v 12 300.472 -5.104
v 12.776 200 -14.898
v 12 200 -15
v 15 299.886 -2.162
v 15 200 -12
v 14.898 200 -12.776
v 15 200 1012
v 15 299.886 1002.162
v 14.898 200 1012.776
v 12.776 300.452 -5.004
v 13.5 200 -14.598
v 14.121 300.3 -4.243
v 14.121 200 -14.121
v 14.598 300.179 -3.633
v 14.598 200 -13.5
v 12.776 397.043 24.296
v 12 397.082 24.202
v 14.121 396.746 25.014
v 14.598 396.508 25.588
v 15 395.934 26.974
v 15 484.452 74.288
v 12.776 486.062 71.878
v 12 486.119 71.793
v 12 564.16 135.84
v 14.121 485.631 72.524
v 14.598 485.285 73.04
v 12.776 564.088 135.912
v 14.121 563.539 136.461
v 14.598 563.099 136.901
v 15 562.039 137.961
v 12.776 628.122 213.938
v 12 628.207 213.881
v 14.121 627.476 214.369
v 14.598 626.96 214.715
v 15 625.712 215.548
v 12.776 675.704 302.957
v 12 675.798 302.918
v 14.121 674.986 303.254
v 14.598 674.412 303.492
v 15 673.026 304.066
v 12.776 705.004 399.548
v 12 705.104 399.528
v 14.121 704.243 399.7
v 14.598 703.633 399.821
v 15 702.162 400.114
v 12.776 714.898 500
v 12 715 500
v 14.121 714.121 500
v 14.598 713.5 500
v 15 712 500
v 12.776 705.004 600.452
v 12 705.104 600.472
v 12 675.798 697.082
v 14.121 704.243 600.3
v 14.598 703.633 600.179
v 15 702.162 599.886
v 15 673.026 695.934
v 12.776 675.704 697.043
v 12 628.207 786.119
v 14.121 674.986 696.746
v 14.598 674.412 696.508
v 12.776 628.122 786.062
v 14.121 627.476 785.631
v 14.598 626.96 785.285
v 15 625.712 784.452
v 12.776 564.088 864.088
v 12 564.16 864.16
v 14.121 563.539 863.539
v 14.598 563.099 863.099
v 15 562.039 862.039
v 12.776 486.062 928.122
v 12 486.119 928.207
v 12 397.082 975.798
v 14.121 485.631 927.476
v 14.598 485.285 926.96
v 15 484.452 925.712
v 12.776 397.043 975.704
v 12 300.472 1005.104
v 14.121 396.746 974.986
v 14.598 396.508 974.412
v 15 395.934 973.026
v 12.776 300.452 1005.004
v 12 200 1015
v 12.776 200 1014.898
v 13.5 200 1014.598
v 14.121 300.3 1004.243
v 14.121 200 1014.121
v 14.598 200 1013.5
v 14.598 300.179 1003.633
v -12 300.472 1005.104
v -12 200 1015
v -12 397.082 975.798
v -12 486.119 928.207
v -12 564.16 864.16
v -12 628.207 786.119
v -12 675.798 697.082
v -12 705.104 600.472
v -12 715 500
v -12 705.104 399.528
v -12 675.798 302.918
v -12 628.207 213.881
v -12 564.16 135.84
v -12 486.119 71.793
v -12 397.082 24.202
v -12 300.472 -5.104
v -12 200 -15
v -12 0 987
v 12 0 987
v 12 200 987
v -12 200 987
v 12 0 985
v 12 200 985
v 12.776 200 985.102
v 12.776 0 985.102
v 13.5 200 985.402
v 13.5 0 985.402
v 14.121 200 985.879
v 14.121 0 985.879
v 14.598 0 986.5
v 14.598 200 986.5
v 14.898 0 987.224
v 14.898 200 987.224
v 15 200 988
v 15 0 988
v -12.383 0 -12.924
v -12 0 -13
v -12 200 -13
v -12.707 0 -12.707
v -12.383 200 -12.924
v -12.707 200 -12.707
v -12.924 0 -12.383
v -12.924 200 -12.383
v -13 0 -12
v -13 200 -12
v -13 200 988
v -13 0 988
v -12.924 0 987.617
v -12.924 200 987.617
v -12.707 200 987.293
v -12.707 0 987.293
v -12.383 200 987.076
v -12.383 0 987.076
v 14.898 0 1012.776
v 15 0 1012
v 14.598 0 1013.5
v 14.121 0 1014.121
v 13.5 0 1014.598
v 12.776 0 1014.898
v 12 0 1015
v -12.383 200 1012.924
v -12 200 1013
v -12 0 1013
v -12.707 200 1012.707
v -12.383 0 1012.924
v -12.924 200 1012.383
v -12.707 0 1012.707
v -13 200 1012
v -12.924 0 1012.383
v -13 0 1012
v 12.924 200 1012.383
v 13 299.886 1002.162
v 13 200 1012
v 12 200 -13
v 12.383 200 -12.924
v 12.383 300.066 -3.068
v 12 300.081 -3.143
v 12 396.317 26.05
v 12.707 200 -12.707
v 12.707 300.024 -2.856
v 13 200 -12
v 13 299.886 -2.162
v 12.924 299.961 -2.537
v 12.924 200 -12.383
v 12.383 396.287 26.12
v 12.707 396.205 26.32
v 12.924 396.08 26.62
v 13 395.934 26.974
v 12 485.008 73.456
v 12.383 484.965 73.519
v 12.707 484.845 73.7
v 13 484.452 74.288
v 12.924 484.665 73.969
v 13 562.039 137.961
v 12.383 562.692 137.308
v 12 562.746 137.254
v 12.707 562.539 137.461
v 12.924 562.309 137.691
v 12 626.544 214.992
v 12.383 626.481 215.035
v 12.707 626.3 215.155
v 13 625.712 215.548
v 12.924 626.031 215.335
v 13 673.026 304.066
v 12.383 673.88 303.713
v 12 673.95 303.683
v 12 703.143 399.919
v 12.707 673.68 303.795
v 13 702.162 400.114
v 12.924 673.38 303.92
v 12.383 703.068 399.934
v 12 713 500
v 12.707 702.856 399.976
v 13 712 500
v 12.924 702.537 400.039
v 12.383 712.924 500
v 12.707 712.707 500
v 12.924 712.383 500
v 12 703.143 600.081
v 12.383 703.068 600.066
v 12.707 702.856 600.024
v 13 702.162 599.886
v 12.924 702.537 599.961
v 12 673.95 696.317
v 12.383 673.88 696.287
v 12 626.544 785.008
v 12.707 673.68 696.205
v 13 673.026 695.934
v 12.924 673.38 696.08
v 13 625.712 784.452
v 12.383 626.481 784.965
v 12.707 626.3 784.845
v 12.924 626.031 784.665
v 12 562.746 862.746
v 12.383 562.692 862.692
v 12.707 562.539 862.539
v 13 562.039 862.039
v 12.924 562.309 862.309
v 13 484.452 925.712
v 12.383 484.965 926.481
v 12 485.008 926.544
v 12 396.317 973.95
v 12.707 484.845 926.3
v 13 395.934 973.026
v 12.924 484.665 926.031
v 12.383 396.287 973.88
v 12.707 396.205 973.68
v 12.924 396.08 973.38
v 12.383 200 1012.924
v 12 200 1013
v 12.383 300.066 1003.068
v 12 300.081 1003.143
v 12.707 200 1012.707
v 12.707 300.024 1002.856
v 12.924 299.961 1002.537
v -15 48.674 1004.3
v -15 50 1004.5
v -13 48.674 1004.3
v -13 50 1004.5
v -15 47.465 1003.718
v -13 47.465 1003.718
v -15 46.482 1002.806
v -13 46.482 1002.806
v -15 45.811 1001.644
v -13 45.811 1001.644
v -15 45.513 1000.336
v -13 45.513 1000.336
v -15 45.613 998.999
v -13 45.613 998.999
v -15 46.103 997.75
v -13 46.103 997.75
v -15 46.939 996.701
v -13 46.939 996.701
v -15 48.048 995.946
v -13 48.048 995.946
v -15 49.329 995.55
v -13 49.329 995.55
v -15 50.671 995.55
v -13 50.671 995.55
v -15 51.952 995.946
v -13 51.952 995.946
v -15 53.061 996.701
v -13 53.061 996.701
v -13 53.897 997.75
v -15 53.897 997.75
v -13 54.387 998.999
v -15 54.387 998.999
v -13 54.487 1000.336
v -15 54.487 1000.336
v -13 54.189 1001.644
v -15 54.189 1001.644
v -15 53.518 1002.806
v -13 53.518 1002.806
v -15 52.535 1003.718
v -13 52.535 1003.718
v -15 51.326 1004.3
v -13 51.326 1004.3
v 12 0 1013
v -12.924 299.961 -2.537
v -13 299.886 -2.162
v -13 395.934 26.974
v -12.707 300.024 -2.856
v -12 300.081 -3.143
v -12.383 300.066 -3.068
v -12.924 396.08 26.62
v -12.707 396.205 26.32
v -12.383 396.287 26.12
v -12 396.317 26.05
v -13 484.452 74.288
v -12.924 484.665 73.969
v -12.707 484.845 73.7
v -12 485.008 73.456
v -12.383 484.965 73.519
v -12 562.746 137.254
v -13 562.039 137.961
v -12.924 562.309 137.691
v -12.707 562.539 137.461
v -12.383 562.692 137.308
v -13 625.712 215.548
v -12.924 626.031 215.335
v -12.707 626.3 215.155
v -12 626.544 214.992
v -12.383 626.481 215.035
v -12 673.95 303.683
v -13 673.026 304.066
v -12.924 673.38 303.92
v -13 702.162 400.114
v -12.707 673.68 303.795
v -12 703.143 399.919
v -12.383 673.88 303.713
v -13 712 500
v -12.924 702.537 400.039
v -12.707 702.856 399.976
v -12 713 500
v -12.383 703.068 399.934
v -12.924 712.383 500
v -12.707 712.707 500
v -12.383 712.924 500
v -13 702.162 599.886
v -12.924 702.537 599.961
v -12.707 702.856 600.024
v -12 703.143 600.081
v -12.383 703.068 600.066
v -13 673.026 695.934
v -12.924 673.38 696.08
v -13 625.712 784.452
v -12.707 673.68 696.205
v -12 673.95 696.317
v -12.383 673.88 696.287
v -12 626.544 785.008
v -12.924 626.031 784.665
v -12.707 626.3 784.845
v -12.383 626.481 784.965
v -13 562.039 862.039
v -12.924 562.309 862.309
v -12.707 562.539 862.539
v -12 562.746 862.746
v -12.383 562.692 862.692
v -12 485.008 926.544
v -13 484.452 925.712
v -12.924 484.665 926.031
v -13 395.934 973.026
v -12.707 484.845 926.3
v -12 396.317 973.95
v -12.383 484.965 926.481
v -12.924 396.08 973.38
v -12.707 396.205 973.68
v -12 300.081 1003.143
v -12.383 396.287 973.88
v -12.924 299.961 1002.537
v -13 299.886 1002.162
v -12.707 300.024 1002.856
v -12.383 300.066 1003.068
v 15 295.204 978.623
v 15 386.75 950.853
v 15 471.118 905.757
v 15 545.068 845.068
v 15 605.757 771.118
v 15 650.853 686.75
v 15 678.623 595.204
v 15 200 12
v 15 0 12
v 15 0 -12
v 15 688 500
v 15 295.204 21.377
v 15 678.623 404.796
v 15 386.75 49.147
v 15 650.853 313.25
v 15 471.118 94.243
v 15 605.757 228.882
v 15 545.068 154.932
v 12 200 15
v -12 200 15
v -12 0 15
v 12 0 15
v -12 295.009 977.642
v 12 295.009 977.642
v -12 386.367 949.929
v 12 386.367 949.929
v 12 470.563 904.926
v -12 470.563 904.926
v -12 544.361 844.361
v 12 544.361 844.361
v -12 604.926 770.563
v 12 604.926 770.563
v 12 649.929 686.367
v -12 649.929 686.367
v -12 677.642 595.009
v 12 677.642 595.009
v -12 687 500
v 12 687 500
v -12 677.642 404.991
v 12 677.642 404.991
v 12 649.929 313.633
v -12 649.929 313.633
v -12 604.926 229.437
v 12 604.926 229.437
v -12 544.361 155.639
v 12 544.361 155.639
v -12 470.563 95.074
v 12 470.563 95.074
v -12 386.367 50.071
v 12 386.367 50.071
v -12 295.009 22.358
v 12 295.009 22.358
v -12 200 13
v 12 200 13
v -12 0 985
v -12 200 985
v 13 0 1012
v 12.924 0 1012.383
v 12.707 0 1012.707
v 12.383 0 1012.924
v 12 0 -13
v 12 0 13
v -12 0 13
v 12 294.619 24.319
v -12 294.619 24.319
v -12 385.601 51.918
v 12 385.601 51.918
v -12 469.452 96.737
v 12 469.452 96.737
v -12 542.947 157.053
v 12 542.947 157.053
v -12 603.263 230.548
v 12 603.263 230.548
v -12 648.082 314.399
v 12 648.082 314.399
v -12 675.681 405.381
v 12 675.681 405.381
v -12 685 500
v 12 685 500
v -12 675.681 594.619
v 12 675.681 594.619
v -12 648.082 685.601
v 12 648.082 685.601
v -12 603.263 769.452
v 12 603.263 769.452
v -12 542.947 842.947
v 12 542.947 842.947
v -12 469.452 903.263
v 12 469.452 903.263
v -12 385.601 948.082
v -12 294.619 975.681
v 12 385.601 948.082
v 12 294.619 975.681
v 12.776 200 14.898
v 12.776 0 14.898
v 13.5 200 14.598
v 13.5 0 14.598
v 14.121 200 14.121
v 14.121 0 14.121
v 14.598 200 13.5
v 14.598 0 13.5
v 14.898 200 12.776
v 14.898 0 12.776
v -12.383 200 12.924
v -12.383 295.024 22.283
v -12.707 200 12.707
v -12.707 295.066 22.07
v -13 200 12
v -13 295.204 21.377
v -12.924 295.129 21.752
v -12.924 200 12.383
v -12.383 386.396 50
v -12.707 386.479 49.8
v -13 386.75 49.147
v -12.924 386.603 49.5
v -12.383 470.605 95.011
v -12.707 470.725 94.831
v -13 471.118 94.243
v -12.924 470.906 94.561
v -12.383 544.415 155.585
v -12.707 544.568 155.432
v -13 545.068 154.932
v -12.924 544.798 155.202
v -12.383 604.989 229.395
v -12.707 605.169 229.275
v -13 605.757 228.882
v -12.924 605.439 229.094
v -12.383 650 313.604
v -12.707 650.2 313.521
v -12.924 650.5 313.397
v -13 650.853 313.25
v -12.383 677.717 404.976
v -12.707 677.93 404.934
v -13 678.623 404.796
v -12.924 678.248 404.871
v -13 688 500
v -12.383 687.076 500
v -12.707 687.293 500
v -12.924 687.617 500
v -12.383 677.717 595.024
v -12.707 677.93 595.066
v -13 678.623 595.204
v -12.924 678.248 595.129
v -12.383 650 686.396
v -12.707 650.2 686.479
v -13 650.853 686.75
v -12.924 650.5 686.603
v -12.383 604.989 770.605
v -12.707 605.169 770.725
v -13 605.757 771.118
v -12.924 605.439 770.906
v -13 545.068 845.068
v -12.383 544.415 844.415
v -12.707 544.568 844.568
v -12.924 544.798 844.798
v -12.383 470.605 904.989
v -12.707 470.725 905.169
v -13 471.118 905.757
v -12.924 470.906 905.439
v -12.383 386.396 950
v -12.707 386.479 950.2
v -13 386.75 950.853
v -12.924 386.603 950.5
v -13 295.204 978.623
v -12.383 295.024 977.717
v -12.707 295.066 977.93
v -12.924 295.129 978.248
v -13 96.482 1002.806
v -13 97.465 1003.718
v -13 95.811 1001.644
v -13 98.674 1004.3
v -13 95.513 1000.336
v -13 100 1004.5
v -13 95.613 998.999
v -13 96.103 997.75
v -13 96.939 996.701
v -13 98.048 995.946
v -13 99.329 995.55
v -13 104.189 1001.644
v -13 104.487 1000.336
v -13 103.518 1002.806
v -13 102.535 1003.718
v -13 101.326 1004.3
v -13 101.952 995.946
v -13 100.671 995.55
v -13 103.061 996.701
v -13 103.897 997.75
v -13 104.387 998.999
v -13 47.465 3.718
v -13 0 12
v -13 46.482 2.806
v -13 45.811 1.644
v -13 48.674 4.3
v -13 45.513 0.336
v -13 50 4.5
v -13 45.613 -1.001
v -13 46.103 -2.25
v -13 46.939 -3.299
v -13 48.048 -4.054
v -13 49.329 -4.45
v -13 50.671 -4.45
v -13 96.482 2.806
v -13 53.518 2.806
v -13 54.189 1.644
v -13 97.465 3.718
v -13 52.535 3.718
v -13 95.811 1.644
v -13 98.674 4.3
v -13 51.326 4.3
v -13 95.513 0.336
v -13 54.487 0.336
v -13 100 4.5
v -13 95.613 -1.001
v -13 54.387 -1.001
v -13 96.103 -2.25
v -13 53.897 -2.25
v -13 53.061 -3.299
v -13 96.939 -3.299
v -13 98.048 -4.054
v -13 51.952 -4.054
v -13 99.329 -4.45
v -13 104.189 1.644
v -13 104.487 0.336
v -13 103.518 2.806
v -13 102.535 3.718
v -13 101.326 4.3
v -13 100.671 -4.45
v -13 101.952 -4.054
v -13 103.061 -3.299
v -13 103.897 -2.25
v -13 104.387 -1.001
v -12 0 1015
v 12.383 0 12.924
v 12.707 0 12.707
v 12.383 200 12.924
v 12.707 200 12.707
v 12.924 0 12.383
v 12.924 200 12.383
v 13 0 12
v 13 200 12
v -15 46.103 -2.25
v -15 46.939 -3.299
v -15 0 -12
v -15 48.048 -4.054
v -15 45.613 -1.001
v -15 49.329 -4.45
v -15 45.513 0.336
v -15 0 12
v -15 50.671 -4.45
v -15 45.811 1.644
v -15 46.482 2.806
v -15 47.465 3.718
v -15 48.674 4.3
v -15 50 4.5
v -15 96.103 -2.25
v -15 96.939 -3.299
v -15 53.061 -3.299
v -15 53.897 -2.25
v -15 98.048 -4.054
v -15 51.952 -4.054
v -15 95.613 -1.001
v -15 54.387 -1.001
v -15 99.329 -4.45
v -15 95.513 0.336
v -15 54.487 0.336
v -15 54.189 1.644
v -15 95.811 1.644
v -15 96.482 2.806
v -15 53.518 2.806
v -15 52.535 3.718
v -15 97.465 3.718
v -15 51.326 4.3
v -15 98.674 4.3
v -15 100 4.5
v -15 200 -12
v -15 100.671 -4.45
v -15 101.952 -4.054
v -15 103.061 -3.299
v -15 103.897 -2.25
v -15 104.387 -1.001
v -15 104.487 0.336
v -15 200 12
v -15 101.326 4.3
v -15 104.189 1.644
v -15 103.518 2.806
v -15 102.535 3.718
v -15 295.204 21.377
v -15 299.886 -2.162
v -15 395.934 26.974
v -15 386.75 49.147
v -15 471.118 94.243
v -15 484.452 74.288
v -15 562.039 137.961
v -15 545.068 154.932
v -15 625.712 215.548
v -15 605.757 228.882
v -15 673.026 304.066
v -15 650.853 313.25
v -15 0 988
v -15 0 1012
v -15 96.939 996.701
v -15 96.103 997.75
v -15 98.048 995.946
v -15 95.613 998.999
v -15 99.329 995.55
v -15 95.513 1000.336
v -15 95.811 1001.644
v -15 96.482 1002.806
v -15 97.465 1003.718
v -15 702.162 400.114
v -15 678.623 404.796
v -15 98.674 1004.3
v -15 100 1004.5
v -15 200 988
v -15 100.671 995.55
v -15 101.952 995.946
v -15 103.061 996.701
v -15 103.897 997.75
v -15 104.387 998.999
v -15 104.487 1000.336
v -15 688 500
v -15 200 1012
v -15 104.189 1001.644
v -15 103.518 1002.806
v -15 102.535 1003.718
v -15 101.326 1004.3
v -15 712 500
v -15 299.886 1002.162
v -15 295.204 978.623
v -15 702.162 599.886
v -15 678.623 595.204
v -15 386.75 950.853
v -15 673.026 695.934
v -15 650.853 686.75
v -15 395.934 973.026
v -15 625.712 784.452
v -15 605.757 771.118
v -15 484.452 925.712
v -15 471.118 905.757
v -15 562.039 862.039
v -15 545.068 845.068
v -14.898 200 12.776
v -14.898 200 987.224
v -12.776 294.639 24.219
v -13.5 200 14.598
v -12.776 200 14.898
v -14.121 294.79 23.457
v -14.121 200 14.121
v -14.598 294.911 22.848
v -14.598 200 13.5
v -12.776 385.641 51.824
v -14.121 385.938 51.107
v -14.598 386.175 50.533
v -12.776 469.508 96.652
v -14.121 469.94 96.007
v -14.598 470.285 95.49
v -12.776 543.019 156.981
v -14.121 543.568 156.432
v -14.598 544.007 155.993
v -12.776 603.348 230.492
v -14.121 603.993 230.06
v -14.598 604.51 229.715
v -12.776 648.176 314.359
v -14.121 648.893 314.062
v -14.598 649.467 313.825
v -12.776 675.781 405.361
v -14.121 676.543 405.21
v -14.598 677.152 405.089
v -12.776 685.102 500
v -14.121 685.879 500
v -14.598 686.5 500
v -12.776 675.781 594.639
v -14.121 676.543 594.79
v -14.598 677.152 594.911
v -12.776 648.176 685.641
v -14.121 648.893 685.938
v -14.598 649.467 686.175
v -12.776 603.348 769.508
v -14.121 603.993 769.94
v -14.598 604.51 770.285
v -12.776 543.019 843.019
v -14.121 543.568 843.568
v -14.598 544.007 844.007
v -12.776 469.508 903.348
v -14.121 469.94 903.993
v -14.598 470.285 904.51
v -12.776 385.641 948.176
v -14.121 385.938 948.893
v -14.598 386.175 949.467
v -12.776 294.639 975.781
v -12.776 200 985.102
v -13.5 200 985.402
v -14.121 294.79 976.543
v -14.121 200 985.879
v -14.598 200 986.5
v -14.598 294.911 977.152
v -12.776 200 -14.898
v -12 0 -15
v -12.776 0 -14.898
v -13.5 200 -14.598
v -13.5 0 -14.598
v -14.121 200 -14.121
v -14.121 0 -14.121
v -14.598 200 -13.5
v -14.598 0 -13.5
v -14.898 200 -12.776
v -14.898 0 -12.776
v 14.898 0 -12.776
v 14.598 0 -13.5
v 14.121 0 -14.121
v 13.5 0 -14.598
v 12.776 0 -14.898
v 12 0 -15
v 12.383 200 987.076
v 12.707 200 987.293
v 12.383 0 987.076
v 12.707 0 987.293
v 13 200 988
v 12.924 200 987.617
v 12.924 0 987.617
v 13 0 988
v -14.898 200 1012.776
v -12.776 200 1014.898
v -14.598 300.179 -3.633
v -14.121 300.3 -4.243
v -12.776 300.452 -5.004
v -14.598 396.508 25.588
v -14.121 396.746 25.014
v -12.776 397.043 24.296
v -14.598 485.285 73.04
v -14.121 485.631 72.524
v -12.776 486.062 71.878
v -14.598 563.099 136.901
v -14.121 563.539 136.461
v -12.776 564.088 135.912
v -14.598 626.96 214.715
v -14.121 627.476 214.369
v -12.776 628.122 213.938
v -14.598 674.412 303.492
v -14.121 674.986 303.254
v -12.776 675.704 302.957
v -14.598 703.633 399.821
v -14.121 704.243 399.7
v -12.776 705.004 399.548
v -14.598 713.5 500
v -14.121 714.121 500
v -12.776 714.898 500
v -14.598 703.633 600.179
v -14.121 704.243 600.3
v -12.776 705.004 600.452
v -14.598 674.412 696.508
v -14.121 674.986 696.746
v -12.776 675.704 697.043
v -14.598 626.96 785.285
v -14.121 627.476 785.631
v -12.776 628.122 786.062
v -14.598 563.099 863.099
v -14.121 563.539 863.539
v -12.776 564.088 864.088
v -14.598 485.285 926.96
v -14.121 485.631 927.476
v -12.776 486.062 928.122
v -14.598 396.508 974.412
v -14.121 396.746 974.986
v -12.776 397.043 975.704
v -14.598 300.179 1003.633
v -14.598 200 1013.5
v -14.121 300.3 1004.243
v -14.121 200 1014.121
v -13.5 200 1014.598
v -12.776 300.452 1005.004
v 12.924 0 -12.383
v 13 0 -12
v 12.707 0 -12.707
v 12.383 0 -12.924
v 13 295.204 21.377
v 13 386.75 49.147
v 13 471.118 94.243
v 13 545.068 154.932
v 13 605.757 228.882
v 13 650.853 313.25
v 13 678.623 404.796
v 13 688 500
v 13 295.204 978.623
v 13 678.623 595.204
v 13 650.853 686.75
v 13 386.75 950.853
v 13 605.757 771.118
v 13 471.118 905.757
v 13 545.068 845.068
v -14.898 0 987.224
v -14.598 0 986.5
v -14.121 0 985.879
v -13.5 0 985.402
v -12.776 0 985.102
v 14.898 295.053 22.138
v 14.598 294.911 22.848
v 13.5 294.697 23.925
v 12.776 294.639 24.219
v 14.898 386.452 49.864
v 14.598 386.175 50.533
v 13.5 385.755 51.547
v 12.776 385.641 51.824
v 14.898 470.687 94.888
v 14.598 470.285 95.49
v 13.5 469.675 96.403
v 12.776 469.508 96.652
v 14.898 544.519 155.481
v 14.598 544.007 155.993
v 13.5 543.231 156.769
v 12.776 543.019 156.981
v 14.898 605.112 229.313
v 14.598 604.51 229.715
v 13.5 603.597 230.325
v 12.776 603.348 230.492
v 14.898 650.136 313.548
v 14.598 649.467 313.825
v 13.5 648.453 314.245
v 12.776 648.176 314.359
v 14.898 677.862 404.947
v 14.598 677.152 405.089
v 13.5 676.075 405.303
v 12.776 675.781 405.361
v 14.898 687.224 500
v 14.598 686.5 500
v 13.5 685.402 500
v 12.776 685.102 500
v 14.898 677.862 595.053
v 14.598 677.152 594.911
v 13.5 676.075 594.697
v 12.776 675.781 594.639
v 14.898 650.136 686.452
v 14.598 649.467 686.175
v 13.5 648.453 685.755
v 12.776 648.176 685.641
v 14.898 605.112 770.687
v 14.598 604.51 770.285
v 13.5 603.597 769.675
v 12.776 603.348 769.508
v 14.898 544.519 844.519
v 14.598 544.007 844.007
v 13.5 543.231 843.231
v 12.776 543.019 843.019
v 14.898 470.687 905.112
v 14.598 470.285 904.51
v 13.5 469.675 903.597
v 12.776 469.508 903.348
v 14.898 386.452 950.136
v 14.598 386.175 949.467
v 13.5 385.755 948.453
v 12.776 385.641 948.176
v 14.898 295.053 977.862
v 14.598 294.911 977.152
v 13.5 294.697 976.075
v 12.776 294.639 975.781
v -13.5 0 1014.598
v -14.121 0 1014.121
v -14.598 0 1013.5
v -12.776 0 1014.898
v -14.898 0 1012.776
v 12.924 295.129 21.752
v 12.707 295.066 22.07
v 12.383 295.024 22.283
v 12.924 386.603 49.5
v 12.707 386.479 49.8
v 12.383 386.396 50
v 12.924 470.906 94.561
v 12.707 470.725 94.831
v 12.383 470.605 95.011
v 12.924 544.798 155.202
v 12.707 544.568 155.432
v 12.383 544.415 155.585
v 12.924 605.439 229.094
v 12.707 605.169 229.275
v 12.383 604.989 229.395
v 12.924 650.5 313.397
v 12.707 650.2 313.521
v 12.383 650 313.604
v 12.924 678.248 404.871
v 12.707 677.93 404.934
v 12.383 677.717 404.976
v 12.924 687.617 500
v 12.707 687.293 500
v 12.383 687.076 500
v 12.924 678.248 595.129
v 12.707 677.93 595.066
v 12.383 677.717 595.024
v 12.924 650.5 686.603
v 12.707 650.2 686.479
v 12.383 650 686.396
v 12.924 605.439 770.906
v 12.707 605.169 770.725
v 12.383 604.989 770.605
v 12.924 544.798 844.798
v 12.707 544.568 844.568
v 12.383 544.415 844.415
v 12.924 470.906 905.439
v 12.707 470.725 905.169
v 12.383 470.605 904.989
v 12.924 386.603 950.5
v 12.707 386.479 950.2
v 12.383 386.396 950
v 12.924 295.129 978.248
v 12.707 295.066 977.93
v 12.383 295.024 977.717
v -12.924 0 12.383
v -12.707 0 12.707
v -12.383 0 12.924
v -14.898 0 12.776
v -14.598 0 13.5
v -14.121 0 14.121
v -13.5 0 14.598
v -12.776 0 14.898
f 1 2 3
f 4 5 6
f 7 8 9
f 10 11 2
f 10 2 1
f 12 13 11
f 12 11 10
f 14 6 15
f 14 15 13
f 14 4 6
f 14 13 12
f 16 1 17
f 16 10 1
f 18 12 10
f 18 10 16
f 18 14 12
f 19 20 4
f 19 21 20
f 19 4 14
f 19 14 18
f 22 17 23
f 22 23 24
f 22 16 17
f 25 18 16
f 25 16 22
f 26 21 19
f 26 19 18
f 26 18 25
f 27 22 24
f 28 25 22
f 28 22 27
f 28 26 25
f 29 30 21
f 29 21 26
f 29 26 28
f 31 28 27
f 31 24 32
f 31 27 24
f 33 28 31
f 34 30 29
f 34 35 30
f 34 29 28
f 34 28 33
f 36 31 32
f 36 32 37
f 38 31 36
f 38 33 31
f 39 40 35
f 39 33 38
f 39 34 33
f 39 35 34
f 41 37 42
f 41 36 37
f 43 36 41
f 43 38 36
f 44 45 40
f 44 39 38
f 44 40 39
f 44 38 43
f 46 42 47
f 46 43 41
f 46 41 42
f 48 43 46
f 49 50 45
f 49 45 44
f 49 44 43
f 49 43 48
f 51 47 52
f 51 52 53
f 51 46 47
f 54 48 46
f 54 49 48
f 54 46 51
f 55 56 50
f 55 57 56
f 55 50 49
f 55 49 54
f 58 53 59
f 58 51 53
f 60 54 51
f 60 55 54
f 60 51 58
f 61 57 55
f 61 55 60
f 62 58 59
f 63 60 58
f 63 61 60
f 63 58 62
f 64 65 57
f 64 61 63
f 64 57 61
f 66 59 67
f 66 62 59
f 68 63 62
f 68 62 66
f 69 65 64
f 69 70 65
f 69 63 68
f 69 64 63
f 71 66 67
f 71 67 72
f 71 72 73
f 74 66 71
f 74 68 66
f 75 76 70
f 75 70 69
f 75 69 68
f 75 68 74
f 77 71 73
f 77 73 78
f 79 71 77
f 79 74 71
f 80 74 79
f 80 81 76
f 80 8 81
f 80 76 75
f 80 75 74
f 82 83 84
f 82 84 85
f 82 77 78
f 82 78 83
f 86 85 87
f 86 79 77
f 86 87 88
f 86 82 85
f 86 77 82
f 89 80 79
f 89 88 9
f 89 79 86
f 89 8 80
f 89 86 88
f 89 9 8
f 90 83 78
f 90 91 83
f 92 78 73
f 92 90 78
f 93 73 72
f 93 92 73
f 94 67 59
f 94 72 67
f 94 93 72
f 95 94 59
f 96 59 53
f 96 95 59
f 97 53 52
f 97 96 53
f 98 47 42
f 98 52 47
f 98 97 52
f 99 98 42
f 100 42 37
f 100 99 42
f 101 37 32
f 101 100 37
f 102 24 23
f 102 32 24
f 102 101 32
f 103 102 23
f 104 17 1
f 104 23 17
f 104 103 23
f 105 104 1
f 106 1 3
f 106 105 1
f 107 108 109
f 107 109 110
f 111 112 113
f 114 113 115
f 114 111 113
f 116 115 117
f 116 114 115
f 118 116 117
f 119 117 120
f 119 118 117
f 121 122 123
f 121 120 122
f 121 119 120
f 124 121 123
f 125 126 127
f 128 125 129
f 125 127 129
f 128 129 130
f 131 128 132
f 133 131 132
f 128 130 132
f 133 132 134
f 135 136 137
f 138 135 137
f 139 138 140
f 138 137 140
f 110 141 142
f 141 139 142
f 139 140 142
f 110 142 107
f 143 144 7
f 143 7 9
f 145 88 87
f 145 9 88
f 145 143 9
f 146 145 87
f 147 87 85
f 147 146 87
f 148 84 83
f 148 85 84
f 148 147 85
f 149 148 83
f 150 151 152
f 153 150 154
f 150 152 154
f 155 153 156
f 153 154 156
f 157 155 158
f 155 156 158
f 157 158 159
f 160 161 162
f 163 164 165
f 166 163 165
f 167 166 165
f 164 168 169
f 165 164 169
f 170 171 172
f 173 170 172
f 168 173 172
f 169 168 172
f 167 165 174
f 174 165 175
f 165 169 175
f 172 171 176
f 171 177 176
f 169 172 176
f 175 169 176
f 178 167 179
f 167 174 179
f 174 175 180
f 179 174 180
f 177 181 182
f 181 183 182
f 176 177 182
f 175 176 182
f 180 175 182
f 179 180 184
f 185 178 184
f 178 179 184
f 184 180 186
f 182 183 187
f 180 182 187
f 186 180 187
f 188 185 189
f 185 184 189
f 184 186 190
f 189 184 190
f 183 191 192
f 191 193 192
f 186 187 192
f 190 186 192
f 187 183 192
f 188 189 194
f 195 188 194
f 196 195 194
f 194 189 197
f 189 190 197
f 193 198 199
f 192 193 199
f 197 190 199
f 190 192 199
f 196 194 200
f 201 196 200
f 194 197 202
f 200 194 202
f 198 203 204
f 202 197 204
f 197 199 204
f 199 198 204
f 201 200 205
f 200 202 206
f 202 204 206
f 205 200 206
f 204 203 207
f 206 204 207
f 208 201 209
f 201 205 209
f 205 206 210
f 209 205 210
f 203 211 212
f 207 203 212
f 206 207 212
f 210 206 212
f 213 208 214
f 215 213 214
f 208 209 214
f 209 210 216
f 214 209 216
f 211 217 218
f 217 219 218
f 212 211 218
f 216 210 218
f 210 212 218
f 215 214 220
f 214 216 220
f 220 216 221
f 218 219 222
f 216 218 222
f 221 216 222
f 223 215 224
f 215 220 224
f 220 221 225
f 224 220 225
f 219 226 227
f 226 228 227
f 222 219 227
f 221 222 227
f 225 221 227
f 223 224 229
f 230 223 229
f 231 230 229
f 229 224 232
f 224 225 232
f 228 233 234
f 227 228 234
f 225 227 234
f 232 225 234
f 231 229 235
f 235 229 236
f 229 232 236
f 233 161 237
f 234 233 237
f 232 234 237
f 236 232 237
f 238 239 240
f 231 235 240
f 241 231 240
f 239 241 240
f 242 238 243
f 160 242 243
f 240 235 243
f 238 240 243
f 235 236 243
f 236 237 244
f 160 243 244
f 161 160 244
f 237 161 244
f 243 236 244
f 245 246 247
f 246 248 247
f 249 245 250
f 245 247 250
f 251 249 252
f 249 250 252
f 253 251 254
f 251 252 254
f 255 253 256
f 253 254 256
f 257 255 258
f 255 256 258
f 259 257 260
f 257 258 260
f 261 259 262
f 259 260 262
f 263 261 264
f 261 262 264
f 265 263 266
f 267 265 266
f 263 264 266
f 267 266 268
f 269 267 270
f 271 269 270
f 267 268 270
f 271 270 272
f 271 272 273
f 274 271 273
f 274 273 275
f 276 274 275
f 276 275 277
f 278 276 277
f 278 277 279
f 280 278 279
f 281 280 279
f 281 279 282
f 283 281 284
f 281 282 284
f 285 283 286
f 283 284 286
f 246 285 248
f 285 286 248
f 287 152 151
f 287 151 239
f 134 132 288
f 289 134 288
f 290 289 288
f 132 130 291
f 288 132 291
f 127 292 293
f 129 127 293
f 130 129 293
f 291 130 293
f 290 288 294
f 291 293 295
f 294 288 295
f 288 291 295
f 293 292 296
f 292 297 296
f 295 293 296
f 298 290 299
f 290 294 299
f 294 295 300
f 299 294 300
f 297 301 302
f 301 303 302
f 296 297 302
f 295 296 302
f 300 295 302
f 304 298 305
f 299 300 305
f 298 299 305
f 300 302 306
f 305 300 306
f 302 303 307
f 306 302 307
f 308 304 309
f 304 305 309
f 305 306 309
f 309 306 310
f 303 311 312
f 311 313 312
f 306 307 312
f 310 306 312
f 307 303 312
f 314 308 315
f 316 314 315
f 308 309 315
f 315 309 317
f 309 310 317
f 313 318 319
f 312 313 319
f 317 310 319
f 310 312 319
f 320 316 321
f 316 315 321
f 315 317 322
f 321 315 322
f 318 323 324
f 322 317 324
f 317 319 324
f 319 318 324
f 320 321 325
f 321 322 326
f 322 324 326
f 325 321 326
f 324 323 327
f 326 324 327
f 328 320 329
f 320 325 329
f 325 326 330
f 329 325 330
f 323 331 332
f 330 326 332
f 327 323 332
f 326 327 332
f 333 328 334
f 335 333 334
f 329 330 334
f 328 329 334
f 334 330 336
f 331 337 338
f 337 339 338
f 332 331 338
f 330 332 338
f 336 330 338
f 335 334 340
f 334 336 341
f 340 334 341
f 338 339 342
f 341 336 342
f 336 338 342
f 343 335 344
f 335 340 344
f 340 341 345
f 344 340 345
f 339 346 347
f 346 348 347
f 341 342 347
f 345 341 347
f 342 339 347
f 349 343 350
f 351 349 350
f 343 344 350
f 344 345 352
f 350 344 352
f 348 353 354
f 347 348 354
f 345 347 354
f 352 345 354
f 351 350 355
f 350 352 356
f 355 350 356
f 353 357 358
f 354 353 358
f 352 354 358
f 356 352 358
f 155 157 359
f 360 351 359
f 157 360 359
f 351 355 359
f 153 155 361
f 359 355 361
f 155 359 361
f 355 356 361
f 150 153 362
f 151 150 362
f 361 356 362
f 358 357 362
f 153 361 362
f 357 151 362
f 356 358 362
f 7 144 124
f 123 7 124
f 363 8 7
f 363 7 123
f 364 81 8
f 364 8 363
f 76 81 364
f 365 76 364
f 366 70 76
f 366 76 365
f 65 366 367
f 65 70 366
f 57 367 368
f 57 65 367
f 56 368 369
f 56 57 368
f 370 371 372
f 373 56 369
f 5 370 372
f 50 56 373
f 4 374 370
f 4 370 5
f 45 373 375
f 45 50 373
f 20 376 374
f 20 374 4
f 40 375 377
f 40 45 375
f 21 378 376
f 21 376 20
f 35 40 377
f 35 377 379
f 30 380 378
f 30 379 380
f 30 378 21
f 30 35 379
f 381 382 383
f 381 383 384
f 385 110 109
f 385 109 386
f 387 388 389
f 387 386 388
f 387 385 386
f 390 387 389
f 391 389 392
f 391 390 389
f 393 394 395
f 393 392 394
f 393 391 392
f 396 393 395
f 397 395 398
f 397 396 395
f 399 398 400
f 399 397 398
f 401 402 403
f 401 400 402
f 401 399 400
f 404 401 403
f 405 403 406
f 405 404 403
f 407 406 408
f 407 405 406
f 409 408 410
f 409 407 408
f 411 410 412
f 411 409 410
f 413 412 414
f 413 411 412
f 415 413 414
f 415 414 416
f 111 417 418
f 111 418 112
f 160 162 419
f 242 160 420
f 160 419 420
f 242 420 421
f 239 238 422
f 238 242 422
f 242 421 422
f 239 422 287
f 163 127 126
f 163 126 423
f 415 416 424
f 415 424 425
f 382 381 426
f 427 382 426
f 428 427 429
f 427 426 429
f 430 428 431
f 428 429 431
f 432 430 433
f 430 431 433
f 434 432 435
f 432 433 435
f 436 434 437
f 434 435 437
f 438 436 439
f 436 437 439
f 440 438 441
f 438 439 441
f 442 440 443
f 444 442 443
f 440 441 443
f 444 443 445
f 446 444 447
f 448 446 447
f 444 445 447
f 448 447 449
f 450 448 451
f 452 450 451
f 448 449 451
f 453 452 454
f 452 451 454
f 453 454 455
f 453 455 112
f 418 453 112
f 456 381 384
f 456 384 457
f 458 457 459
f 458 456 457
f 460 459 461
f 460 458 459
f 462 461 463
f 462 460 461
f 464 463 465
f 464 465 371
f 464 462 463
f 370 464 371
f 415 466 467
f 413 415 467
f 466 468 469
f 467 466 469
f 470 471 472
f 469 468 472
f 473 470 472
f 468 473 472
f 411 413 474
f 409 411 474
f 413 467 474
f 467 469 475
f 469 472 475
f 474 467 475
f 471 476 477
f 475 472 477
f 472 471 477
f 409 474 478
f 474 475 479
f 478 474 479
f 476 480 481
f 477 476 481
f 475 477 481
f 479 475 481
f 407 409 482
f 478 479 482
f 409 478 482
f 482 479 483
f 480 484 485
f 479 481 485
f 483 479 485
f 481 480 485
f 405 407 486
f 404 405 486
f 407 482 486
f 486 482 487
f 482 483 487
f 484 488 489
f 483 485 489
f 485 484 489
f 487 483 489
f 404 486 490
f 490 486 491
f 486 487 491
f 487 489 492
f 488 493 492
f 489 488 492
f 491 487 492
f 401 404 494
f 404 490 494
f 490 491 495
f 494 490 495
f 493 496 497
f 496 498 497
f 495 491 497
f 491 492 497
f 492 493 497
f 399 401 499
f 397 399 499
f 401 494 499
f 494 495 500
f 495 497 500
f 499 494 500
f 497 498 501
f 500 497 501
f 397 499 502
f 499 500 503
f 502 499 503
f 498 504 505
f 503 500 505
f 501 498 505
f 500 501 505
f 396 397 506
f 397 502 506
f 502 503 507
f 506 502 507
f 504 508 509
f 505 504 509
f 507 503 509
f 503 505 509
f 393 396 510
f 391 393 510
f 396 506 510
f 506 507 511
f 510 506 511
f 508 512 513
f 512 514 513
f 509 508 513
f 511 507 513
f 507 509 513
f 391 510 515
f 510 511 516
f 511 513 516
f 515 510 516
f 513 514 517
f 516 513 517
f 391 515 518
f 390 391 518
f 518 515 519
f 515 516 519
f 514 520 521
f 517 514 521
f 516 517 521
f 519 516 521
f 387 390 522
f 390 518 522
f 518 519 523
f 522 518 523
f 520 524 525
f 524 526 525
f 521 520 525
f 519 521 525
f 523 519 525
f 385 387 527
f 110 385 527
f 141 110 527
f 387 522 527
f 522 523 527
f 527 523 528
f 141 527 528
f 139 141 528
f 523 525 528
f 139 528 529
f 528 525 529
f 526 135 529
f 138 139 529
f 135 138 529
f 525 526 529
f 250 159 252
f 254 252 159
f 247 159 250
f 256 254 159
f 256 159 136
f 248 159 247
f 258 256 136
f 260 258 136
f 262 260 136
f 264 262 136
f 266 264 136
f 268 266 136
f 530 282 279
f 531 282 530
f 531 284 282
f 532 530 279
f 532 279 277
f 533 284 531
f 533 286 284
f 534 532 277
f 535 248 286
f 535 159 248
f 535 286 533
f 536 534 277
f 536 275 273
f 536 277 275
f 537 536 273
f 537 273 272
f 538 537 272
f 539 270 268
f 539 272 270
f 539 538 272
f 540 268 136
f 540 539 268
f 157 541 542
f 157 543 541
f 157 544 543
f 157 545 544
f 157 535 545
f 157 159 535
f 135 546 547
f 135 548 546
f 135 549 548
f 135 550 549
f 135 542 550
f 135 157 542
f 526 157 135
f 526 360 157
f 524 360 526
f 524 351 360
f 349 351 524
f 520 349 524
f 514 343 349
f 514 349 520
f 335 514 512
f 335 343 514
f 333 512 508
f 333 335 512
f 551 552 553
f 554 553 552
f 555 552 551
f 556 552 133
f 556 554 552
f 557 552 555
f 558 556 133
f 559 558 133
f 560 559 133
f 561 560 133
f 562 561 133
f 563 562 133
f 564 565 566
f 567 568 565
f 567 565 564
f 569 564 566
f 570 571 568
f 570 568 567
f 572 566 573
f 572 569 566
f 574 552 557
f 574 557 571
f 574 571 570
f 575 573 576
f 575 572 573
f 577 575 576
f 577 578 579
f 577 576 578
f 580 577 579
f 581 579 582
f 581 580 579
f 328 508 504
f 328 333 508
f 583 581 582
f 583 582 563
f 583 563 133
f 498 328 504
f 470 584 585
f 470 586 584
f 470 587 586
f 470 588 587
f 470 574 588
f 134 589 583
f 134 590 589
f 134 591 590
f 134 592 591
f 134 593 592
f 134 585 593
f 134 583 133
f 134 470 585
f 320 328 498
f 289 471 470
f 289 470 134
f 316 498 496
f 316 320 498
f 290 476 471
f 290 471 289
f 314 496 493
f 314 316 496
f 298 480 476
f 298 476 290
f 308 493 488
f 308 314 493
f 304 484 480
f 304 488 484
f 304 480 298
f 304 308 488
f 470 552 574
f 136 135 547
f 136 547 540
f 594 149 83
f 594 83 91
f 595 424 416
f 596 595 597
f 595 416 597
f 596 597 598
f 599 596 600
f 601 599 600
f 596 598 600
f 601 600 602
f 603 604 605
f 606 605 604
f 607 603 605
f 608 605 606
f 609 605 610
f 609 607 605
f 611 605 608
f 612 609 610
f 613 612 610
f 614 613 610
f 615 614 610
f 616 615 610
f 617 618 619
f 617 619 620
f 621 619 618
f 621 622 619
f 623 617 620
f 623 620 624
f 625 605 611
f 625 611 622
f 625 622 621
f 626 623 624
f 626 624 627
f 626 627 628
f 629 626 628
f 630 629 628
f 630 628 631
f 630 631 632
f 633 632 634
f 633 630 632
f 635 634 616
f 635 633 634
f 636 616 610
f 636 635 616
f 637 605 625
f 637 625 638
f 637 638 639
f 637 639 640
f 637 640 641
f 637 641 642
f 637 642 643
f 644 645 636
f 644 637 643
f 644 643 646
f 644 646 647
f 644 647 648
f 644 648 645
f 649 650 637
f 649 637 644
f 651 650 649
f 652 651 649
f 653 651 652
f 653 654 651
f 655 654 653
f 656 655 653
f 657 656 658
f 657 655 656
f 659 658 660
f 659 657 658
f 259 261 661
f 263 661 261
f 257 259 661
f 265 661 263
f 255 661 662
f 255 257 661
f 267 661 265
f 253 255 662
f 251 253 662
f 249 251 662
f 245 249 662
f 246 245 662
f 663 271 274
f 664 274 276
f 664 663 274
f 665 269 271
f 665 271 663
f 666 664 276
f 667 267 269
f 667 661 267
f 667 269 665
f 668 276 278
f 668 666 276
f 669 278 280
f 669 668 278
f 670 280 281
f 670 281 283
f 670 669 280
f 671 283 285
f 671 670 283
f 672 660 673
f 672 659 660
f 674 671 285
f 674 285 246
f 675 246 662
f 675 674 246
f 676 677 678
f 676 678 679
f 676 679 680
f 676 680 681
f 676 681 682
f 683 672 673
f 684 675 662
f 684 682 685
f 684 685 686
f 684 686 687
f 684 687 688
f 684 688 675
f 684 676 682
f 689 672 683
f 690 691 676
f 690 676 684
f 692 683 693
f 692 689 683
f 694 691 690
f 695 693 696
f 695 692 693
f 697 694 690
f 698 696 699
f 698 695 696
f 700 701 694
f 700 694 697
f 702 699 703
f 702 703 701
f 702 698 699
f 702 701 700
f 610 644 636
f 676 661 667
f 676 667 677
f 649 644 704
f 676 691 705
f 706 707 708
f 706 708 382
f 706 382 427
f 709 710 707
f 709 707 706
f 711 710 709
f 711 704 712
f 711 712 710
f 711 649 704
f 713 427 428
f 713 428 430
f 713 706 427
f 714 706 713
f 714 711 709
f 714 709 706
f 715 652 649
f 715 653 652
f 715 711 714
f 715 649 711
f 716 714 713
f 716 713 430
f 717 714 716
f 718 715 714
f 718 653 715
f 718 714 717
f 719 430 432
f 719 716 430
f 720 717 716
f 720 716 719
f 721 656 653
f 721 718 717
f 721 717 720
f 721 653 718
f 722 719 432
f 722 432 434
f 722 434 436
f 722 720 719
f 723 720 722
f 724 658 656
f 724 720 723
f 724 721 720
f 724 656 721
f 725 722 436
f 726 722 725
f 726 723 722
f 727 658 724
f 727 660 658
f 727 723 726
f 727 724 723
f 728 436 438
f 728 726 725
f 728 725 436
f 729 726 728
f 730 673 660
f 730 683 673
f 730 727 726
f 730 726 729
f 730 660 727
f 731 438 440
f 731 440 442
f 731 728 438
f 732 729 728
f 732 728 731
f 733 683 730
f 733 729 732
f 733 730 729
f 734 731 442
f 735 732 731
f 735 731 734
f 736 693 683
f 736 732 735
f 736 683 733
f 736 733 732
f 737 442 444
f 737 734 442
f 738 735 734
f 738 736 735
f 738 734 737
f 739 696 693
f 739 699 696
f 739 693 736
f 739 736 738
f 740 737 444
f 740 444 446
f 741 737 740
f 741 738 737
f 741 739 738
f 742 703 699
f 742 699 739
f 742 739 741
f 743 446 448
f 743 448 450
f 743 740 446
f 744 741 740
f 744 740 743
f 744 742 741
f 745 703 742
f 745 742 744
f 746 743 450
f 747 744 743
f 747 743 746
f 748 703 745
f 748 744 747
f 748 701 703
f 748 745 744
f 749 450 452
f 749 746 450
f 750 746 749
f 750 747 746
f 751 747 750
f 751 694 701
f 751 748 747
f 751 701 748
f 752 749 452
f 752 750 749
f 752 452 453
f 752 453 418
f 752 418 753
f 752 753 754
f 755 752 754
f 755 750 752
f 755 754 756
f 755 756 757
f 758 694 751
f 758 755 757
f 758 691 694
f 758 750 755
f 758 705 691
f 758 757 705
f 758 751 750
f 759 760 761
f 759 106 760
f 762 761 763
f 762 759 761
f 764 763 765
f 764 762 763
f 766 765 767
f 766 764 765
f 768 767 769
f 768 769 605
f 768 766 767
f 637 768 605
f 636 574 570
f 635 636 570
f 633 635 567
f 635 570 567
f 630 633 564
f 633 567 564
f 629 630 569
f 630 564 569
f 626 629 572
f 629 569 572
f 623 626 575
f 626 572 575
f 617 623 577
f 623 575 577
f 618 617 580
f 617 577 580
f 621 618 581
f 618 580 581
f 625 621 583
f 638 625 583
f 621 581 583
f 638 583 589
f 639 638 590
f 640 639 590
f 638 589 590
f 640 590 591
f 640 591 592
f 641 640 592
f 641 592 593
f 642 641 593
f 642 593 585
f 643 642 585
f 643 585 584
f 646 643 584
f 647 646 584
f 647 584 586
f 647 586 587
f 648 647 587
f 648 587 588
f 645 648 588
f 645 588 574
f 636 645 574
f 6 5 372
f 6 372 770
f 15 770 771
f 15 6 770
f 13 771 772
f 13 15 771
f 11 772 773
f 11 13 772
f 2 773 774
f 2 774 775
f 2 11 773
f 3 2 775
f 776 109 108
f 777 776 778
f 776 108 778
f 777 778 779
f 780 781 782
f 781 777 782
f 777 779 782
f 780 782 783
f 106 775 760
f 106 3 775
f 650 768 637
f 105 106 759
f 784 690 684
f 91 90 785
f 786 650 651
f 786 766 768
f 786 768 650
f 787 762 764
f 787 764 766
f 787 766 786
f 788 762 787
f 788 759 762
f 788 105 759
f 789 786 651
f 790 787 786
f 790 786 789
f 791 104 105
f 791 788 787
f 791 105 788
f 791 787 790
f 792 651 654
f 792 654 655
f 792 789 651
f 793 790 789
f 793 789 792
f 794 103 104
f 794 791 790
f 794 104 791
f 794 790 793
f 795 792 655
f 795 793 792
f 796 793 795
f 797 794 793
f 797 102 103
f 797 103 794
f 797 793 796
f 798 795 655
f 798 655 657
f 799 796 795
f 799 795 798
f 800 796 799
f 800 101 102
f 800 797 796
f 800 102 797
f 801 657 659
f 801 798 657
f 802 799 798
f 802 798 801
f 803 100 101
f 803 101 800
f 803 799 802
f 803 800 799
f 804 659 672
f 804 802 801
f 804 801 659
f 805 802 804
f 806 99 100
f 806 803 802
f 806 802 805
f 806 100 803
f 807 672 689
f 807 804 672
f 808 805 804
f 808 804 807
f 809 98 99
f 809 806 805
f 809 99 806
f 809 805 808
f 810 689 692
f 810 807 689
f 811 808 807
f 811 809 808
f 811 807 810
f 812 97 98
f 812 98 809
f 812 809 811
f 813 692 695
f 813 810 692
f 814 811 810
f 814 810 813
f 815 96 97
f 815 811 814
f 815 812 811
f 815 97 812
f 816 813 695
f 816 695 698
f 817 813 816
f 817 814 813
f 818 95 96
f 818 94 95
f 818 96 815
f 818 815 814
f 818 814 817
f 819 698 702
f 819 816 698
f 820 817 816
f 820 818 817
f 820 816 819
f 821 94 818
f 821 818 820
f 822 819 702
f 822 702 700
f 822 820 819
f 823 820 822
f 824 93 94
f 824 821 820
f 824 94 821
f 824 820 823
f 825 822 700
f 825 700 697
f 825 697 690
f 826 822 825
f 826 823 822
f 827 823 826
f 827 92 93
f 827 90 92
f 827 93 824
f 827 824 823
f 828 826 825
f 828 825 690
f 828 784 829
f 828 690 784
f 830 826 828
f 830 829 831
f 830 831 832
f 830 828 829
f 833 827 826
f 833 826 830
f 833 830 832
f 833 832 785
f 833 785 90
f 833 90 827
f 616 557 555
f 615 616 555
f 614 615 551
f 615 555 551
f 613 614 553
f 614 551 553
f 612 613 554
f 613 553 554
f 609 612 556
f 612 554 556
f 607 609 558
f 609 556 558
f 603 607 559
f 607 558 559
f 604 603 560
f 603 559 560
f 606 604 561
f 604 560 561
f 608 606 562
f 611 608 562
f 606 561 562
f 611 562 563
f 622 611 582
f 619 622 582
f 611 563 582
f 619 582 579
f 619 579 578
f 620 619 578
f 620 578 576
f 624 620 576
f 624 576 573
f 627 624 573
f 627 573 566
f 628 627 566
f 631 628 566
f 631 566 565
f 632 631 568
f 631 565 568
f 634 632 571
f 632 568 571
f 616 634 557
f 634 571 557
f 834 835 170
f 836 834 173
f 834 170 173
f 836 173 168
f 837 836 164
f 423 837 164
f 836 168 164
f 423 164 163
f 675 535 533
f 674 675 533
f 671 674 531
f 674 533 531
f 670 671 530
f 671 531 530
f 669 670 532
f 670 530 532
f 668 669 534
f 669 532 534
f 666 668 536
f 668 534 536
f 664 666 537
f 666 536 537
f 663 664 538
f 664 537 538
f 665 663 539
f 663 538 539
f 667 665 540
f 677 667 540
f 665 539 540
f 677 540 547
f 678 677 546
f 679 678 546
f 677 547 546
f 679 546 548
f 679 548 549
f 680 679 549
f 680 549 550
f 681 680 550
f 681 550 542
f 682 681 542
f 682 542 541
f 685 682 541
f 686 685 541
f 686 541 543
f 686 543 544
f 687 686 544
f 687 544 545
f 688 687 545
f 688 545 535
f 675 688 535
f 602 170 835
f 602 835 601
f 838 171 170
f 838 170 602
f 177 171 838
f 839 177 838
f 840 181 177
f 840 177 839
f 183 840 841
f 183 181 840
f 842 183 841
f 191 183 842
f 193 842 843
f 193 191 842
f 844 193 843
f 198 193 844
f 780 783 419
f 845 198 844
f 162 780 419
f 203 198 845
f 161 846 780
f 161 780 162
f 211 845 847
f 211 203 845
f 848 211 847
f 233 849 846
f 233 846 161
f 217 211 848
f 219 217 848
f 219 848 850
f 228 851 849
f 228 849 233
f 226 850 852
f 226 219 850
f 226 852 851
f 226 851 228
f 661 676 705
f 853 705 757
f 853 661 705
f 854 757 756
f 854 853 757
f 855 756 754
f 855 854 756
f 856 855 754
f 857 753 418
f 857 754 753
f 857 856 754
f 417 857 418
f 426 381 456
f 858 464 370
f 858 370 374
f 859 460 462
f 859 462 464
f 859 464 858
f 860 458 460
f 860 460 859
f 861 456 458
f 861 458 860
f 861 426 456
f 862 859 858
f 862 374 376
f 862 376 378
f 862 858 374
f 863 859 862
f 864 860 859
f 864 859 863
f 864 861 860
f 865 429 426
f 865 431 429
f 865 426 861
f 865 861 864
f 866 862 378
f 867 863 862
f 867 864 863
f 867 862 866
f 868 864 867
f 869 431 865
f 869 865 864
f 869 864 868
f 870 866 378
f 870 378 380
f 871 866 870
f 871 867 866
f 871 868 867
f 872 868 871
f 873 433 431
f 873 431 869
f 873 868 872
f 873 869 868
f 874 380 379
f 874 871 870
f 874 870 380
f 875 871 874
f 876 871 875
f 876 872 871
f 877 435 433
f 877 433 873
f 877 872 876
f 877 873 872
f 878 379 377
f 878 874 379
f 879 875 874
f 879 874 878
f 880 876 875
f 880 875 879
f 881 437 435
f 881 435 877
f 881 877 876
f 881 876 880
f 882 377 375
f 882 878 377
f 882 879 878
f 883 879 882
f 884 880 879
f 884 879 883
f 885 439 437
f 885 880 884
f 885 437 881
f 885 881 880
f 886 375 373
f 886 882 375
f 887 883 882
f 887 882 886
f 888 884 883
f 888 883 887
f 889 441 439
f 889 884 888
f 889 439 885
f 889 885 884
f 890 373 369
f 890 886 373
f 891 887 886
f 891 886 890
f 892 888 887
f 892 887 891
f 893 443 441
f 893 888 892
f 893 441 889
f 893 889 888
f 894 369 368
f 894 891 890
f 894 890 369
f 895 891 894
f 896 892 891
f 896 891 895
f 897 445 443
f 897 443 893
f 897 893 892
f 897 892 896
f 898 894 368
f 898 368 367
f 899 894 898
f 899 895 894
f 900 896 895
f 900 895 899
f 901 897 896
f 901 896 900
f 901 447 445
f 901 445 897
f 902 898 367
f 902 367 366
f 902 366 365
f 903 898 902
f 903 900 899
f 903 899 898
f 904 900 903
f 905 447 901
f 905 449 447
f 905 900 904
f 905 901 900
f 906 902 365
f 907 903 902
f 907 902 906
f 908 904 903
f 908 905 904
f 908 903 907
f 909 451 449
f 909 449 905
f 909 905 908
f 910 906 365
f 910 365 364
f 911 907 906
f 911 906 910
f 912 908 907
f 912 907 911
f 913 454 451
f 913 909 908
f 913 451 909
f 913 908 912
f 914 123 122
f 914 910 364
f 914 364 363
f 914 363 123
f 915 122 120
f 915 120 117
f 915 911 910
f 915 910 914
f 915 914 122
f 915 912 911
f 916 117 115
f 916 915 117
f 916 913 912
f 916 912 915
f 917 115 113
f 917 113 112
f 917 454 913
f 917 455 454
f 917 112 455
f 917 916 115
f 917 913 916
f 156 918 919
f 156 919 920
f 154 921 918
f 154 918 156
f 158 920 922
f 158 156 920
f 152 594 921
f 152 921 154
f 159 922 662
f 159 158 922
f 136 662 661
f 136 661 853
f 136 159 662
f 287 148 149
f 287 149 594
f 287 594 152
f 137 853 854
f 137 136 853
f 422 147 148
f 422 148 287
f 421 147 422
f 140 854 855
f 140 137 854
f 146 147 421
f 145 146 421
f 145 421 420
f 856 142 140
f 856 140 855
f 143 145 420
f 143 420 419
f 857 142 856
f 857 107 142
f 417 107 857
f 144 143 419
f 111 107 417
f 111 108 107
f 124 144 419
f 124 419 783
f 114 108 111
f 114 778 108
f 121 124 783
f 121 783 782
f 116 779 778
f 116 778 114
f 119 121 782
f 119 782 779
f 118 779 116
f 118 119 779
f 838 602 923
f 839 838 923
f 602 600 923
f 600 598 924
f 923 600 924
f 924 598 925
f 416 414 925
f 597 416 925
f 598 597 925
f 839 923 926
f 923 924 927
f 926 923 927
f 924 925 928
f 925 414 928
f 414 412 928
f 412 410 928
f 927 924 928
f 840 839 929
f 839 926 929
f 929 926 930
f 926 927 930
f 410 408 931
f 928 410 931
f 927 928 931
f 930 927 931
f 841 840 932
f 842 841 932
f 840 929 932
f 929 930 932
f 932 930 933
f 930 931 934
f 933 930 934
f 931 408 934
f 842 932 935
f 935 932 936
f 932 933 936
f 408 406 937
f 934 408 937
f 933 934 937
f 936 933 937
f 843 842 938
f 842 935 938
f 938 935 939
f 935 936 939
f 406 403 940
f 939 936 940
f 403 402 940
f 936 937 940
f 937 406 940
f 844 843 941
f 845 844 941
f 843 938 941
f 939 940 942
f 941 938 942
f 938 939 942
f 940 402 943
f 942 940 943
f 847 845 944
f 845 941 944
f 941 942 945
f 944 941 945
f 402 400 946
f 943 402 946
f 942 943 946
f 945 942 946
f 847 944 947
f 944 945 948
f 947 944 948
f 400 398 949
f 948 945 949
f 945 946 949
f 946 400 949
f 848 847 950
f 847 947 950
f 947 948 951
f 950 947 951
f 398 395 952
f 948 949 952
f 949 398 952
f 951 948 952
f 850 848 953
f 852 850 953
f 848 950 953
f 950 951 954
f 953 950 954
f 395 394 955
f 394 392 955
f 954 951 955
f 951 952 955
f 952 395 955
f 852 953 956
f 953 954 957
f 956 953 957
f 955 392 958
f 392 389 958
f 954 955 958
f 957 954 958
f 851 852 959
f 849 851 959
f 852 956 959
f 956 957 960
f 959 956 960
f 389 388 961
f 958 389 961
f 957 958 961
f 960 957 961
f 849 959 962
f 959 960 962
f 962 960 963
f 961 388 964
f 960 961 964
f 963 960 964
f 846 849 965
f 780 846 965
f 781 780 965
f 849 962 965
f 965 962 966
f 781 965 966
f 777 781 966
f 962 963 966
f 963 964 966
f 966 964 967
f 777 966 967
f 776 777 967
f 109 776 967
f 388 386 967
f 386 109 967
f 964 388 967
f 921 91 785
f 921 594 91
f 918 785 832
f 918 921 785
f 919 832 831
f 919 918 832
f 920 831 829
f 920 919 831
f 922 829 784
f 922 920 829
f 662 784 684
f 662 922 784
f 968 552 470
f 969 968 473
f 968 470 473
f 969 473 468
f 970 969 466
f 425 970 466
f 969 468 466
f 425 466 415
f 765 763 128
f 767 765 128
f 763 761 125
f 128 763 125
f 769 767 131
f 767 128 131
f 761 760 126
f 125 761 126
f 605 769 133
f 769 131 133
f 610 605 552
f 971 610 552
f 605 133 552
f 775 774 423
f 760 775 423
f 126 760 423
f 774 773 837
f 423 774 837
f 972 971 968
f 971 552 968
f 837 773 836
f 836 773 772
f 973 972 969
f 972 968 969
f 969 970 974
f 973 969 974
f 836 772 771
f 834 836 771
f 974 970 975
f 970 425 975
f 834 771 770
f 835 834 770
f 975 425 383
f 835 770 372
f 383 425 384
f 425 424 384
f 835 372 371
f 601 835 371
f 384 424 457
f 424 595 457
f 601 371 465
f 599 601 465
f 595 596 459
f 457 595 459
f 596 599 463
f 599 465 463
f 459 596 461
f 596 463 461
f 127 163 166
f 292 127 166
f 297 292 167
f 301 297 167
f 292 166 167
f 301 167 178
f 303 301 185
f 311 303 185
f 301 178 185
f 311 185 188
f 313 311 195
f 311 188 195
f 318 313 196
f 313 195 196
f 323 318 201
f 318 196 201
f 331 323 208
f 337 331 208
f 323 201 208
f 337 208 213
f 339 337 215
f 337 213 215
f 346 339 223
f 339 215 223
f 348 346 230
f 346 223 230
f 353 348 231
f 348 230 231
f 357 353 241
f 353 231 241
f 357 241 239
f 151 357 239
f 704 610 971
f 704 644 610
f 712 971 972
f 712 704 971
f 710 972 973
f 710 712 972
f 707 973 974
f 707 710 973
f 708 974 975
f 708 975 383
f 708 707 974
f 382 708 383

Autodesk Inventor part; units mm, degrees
ref_plane "YZ Plane" through (0, 0, 0) normal (1, 0, 0) x (0, 1, 0)
ref_plane "XZ Plane" through (0, 0, 0) normal (0, 1, 0) x (-1, 0, 0)
sketch "Sketch1" plane through (0, 0, 0) normal (0, 1, 0) x (-1, 0, 0)
  line L0 (-12, 14) -> (12, 14) construction
  line L1 (14, 12) -> (14, -12) construction
  line L2 (12, -14) -> (-12, -14) construction
  line L3 (-14, -12) -> (-14, 12) construction
  line L4 (-14, 14) -> (14, -14) construction
  line L5 (14, 14) -> (-14, -14) construction
  arc A0 (14, 12) -> (12, 14) centre (12, 12) ccw construction
  arc A1 (12, -14) -> (14, -12) centre (12, -12) ccw construction
  arc A2 (-14, -12) -> (-12, -14) centre (-12, -12) ccw construction
  arc A3 (-12, 14) -> (-14, 12) centre (-12, 12) ccw construction
  line L6 (-12, -15) -> (12, -15)
  arc A4 (12, -15) -> (15, -12) centre (12, -12) ccw
  line L7 (15, -12) -> (15, 12)
  arc A5 (15, 12) -> (12, 15) centre (12, 12) ccw
  line L8 (12, 15) -> (-12, 15)
  arc A6 (-12, 15) -> (-15, 12) centre (-12, 12) ccw
  line L9 (-15, 12) -> (-15, -12)
  arc A7 (-15, -12) -> (-12, -15) centre (-12, -12) ccw
  line L10 (13, -12) -> (13, 12)
  arc A8 (13, 12) -> (12, 13) centre (12, 12) ccw
  line L11 (12, 13) -> (-12, 13)
  arc A9 (-12, 13) -> (-13, 12) centre (-12, 12) ccw
  line L12 (-13, 12) -> (-13, -12)
  arc A10 (-13, -12) -> (-12, -13) centre (-12, -12) ccw
  line L13 (-12, -13) -> (12, -13)
  arc A11 (12, -13) -> (13, -12) centre (12, -12) ccw
  point P0 (0, 0)
  point P1 (0, 0)
  point P2 (0, 0)
  dimension "d10" = 2
  dimension "depth" = 30
  dimension "width" = 30
  dimension "thickness" = 2
sketch "Sketch3" plane through (0, 0, 0) normal (1, 0, 0) x (0, 1, 0)
  line L0 (0, 0) -> (200, 0)
  line L1 (200, 0) -> (200, 1000) construction
  line L2 (200, 1000) -> (0, 1000)
  arc A0 (200, 0) -> (200, 1000) centre (200, 500) ccw
  dimension "d29" = 200
  dimension "d30" = 1000
  dimension "d31" = 500
sweep "Sweep1" add profiles "Sketch1" path "Sketch3"
sketch "Sketch4" plane through (-15, 0, 12) normal (-1, 0, 0) x (0, 0, 1)
  line L0 (-24, 0) -> (0, 0) projected
  line L1 (-12, 0) -> (-12, 351.1006) construction
  line L2 (1000, 0) -> (976, 0) projected
  line L3 (988, 0) -> (988, 177.1323) construction
  point P0 (-12, 50)
  point P1 (-12, 100)
  point P2 (988, 50)
  point P3 (988, 100)
  dimension "d34" = 50
  dimension "d35" = 50
  dimension "d36" = 50
  dimension "d37" = 50
hole "Hole2" at (-15, 50, 0) at (-15, 100, 0) at (-15, 50, 1000) at (-15, 100, 1000) direction (1, 0, 0) diameter 9 depth 20.2 tip angle 118
ref_plane "Work Plane1" through (12, 200, 1000) normal (0, 0, -1) x (-1, 0, 0)
ref_plane "Work Plane2" through (0, 715, 500) normal (0, -1, 0) x (1, 0, 0)
equation "\"d10\" = thickness"
equation "\"d31\" = 0.5 * d30"
properties part number "Luk R1000" material "Steel"
